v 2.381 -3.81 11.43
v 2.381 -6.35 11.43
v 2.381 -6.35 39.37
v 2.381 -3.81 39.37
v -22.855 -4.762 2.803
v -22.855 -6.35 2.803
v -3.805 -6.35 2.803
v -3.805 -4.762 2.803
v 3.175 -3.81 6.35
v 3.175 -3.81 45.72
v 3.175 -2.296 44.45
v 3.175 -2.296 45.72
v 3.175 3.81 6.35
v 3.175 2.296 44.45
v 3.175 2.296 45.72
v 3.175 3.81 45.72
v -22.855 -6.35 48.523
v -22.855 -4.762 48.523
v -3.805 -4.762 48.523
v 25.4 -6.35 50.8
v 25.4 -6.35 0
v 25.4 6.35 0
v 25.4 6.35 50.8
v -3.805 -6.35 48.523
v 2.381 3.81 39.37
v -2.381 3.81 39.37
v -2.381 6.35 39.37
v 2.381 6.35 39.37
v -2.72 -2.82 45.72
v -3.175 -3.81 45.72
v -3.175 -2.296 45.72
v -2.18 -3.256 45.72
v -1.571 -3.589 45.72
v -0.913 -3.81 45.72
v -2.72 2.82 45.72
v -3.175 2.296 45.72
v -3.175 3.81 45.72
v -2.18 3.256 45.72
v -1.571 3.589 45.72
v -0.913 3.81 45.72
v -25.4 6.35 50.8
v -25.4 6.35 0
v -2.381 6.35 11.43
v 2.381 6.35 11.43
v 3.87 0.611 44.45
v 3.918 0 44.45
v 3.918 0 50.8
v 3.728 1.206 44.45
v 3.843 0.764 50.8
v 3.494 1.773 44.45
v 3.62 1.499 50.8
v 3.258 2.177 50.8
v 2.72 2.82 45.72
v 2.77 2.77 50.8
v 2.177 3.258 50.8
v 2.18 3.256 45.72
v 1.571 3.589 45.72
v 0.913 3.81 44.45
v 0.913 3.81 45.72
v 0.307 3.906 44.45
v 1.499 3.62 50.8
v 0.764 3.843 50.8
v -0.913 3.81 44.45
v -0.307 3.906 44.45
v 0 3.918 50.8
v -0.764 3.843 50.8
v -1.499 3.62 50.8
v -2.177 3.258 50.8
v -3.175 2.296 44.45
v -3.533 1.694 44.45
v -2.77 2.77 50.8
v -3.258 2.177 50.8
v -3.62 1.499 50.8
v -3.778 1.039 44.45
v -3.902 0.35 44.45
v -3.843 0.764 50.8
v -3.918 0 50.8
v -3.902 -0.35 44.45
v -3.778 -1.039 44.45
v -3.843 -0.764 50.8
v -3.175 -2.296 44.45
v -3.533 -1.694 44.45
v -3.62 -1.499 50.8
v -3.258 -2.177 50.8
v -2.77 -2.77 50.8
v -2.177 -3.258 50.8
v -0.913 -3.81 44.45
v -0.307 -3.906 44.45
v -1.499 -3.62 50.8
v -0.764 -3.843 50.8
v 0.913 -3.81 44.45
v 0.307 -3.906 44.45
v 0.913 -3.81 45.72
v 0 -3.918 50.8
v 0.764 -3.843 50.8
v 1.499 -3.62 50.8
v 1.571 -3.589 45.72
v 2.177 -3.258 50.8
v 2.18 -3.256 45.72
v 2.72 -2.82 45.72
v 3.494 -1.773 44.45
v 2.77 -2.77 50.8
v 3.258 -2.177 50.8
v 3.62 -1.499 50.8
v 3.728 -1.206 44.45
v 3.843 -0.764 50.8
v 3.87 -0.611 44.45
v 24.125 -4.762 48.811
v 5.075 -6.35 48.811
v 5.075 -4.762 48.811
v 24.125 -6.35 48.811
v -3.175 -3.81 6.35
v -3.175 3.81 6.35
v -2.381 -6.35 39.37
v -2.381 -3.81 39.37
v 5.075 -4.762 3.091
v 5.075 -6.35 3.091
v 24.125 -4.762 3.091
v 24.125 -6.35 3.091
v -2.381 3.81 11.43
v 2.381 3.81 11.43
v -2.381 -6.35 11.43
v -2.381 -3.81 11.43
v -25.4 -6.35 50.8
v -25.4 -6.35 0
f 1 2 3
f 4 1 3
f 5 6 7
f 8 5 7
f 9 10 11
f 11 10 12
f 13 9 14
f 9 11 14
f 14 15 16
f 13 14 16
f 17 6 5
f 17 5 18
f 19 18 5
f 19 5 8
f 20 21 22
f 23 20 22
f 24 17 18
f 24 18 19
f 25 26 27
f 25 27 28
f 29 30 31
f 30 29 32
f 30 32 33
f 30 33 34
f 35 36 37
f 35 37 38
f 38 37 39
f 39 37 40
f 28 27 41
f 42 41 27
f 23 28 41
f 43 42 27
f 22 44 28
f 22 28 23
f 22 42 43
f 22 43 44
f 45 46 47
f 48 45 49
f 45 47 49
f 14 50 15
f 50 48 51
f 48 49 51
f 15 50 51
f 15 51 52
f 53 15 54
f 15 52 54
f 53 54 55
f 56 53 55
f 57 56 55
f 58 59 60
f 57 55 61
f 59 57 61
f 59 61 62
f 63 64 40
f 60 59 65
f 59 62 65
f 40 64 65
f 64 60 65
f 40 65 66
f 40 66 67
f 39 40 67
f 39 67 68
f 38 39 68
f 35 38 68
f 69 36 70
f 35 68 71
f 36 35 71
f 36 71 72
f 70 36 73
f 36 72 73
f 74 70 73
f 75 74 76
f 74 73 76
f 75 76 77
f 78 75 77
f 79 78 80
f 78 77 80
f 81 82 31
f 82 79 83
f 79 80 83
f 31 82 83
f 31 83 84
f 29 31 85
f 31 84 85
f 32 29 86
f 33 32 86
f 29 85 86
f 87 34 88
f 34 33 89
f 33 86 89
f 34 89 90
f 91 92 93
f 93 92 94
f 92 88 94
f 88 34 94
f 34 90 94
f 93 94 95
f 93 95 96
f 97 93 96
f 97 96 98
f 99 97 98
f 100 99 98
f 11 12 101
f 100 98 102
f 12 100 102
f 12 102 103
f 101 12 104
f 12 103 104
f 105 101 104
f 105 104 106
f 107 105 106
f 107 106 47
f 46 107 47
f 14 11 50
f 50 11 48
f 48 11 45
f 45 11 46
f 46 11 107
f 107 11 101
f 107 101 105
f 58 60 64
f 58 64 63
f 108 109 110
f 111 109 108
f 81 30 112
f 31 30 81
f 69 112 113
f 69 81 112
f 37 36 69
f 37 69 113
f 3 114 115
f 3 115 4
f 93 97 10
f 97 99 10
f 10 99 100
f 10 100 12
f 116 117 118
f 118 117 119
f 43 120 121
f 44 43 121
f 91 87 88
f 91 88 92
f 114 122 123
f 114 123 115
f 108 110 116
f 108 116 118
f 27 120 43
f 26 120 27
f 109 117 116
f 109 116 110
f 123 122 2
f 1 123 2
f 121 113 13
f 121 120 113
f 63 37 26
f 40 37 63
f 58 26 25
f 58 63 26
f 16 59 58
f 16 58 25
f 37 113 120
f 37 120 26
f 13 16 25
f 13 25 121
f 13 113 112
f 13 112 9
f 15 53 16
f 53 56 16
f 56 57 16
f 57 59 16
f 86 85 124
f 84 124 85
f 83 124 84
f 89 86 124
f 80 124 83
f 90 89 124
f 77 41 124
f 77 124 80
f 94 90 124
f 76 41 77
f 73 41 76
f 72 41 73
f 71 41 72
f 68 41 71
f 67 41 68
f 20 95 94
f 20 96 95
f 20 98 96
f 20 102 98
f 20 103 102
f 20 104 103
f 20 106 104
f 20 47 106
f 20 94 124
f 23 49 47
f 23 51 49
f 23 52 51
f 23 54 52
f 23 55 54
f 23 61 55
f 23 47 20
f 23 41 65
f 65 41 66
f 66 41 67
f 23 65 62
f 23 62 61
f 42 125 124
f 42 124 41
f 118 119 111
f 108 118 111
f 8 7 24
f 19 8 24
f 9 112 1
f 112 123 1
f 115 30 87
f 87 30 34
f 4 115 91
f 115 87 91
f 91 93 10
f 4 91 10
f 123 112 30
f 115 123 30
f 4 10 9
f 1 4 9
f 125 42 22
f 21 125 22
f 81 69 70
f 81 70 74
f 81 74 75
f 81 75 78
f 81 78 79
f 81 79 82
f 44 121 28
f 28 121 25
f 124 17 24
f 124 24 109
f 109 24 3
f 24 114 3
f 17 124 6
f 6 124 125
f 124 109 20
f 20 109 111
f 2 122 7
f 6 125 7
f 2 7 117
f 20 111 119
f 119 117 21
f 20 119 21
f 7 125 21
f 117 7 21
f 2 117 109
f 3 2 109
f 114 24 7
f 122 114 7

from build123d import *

# Parameters (mm, degrees)
F0_W      = 50.8
F0_H      = 12.7
F1_DEPTH  = 50.8
F3_START  = -5.08
F2_W      = 6.35
F2_H      = 7.62
F3_DEPTH  = 39.37
F4_R      = 3.91795
F5_DEPTH  = 6.35
F6_W      = 4.7625
F6_H      = 27.94
F7_DEPTH  = 12.701
F8_W      = 19.05
F8_H      = 45.72
F9_DEPTH  = 1.5875
F10_W     = 19.05
F10_H     = 45.72
F11_DEPTH = 1.5875


with BuildPart() as f1:
    # F0 (on Top) → F1 (new body)
    with BuildSketch(Plane.XY):
        Rectangle(F0_W, F0_H)
    extrude(amount=F1_DEPTH)

    # F2 (on face) → F3 (cut)
    with BuildSketch(Plane.XY.offset(50.8).offset(F3_START)):
        Rectangle(F2_W, F2_H)
    extrude(amount=-F3_DEPTH, mode=Mode.SUBTRACT)

    # F4 (on face) → F5 (cut)
    with BuildSketch(Plane.XY.offset(50.8)):
        Circle(F4_R)
    extrude(amount=-F5_DEPTH, mode=Mode.SUBTRACT)

    # F6 (on face) → F7 (cut, through all)
    with BuildSketch(Plane.XZ.offset(6.35)):
        with Locations((0, 25.4)):
            Rectangle(F6_W, F6_H)
    extrude(amount=-F7_DEPTH, mode=Mode.SUBTRACT)

    # F8 (on face) → F9 (cut)
    with BuildSketch(Plane.XZ.offset(6.35)):
        with Locations((-13.3303813094, 25.6625675702)):
            Rectangle(F8_W, F8_H)
    extrude(amount=-F9_DEPTH, mode=Mode.SUBTRACT)

    # F10 (on face) → F11 (cut)
    with BuildSketch(Plane.XZ.offset(6.35)):
        with Locations((14.600383172, 25.9514273362)):
            Rectangle(F10_W, F10_H)
    extrude(amount=-F11_DEPTH, mode=Mode.SUBTRACT)


solid = f1.part
